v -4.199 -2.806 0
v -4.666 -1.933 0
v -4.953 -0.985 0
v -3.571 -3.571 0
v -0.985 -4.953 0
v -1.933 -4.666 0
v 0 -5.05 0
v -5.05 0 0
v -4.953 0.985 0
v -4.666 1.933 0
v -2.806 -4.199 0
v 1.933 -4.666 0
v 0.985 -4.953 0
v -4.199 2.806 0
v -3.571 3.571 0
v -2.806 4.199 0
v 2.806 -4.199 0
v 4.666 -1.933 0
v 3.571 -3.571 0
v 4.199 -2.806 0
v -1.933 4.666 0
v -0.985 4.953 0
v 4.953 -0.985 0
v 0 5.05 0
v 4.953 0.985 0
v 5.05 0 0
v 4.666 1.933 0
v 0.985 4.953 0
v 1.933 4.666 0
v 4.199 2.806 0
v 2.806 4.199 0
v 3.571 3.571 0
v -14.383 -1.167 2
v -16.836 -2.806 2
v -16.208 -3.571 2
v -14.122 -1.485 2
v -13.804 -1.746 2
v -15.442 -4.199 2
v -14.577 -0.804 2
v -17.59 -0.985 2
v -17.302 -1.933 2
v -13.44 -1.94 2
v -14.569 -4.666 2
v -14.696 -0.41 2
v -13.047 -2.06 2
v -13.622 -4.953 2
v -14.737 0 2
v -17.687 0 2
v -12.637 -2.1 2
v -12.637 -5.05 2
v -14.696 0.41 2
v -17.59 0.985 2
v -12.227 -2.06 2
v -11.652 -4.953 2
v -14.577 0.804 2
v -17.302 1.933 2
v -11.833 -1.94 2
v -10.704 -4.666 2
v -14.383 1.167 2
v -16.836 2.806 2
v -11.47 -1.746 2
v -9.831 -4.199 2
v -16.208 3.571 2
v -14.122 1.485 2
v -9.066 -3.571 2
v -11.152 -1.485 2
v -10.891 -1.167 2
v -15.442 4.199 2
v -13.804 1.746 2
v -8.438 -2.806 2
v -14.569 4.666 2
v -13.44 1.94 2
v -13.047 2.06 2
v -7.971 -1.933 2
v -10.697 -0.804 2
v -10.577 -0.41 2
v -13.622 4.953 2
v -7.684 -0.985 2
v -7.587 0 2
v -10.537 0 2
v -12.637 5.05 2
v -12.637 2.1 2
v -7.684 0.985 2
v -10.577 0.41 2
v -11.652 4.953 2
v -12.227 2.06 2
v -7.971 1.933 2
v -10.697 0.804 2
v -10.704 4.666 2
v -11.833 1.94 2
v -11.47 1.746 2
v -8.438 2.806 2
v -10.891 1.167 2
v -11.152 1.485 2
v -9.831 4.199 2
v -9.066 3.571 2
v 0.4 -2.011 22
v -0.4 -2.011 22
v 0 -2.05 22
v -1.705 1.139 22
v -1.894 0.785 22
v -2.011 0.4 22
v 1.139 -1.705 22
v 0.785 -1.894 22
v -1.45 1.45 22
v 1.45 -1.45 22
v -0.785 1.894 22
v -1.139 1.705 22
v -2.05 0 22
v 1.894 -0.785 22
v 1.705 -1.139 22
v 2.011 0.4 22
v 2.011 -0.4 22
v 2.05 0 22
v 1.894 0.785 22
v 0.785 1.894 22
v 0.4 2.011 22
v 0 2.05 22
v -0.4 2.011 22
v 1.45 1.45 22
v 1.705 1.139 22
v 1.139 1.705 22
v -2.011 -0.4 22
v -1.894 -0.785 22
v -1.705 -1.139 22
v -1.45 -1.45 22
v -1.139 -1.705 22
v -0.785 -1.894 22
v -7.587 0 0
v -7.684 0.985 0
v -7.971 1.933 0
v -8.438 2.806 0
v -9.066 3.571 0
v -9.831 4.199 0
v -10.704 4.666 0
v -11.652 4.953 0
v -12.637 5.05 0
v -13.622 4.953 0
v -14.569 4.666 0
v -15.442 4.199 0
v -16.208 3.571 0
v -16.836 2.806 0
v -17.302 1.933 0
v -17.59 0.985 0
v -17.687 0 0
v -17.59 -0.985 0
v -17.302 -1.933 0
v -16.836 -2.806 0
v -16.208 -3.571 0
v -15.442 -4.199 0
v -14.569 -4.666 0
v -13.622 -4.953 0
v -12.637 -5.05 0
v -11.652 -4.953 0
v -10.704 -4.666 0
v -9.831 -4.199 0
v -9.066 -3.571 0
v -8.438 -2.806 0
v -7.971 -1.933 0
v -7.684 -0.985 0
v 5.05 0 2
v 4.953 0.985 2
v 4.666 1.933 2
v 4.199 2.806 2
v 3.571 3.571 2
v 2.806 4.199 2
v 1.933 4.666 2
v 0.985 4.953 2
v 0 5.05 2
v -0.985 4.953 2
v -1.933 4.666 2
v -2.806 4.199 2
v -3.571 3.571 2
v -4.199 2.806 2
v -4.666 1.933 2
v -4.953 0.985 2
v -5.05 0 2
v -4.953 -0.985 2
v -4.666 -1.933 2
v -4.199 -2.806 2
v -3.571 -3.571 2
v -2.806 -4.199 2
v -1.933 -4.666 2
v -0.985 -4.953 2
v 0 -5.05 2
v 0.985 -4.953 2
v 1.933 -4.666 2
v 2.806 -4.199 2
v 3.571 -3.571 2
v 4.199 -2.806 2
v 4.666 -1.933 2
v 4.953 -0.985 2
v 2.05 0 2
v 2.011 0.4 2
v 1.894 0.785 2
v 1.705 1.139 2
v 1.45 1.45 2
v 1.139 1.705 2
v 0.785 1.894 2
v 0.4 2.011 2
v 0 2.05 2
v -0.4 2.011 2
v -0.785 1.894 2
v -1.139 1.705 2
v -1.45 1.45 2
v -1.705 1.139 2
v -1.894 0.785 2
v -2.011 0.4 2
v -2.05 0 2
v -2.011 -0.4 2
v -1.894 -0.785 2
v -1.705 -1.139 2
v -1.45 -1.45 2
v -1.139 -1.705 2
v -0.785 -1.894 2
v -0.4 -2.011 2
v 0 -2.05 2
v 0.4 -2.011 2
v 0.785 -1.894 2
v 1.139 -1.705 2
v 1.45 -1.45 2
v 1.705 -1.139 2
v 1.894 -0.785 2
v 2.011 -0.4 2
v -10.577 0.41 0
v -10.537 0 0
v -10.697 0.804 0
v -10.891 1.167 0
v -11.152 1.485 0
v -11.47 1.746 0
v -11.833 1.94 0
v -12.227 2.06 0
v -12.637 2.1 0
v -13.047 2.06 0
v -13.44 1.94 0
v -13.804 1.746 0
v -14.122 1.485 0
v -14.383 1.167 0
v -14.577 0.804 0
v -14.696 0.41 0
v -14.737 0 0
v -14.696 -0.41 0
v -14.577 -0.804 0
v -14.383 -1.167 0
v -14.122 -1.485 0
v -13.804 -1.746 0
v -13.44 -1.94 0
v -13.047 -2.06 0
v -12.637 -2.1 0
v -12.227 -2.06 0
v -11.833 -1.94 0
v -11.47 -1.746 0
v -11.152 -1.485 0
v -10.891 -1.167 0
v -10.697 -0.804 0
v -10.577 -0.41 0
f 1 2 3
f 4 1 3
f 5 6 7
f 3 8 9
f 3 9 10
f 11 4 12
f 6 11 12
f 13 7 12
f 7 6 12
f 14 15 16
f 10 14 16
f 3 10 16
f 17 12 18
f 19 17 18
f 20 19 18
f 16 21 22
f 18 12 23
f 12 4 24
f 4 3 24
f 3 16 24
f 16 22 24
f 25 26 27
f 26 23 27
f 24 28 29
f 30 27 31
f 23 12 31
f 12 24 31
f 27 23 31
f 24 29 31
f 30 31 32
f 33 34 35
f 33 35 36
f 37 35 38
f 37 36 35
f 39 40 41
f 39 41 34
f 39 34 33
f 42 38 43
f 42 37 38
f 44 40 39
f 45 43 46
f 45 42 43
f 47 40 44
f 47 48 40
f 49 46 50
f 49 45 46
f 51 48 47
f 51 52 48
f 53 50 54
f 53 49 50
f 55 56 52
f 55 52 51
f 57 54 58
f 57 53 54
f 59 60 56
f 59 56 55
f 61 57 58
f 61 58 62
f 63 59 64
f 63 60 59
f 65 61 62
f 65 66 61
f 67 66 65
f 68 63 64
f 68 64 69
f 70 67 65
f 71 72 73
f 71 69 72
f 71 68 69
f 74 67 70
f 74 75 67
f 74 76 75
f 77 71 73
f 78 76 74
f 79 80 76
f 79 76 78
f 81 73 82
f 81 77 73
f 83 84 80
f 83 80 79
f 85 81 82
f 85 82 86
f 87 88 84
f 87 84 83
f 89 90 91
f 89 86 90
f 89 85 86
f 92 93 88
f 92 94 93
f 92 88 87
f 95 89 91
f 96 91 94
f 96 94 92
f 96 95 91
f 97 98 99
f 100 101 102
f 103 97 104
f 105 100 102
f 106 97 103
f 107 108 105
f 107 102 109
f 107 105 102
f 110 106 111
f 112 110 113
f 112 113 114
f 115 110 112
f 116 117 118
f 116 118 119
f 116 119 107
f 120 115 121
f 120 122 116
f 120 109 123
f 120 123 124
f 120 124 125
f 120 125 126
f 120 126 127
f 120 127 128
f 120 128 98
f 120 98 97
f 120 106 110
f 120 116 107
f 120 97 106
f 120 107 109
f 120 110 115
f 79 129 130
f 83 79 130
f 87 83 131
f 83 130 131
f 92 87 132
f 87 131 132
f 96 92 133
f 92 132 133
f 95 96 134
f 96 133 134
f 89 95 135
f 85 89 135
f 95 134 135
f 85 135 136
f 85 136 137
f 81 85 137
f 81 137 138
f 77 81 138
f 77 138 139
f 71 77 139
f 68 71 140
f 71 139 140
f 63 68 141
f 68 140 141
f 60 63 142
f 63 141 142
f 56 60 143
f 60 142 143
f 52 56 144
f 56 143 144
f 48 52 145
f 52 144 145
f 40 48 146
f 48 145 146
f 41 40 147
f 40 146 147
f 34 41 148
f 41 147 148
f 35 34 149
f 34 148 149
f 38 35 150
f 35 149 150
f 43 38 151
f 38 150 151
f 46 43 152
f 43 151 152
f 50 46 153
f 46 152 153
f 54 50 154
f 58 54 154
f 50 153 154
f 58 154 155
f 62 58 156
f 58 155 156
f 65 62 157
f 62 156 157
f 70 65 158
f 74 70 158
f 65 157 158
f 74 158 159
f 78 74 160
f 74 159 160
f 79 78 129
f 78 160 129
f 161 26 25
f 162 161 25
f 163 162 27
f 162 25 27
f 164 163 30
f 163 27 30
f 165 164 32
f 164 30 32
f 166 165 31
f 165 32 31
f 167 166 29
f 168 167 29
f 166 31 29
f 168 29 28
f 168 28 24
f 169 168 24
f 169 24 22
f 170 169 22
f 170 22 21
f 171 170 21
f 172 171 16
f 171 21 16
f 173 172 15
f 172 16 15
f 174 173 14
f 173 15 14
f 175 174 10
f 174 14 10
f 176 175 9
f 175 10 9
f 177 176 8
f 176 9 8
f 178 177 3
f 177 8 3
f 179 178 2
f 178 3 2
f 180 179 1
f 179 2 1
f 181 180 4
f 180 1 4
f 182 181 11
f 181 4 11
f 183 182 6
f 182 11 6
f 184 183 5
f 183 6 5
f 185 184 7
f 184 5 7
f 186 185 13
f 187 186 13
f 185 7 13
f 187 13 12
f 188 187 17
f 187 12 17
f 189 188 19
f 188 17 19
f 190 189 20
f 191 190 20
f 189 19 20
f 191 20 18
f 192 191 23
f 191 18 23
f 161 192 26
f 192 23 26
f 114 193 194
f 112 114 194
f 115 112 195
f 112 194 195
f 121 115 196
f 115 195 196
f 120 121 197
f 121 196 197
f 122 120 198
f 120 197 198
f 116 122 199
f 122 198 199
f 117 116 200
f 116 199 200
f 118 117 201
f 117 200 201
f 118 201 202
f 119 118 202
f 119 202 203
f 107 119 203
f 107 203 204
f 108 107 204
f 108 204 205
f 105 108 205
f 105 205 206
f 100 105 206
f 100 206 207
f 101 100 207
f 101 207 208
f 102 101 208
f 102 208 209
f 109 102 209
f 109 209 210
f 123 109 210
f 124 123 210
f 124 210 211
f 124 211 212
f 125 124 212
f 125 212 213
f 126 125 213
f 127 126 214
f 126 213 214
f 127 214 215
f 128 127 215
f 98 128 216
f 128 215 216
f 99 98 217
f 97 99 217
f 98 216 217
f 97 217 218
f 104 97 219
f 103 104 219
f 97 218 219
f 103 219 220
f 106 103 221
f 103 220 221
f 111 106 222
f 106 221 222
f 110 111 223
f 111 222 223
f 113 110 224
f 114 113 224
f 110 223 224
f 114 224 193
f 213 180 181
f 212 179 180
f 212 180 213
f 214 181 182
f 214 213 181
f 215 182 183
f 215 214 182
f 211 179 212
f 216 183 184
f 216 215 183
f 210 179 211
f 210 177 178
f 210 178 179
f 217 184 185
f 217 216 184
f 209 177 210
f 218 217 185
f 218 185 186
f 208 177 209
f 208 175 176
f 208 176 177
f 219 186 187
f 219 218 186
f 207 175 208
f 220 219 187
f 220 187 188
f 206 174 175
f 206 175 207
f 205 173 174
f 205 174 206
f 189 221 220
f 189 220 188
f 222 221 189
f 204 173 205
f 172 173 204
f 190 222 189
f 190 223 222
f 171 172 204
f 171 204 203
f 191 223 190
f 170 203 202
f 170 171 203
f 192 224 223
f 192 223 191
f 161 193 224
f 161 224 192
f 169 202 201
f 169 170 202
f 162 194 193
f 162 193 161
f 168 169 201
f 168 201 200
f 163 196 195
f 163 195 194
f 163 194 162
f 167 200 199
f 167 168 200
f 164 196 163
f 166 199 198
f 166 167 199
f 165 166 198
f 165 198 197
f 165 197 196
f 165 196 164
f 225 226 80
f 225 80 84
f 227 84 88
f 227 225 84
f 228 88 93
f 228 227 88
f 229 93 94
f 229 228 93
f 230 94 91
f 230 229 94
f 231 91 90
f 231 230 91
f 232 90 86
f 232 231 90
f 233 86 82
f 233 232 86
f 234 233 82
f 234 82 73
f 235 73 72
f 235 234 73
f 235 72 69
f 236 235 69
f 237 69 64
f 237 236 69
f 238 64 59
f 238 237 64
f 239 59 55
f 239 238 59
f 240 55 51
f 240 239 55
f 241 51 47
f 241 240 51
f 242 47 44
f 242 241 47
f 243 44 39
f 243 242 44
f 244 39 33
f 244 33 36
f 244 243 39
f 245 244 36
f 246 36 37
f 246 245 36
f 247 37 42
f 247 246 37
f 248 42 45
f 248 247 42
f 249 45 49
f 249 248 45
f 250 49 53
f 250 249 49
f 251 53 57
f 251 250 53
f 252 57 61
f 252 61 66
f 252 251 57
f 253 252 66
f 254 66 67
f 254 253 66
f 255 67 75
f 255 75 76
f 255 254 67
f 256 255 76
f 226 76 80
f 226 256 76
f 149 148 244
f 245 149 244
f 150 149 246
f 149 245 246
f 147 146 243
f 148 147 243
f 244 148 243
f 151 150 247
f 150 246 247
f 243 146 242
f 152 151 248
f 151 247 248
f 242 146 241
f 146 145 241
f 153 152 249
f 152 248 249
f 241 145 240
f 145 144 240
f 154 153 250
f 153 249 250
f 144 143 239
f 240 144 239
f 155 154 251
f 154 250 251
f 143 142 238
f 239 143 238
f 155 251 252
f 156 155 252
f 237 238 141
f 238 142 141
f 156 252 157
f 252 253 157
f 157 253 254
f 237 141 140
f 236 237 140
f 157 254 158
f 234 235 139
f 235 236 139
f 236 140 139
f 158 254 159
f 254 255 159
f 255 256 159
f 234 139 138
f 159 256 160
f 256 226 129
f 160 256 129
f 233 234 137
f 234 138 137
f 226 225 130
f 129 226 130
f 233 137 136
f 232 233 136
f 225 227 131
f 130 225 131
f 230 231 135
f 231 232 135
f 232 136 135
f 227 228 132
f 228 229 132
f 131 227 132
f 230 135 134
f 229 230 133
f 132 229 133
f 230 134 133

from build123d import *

# Parameters (mm, degrees)
F0_R     = 5.05
F0_R_2   = 2.05
F0_R_3   = 2.1
F1_DEPTH = 2
F2_DEPTH = 22


with BuildPart() as f1:
    # F0 (on Top) → F1 (new body)
    with BuildSketch(Plane.XY):
        Circle(F0_R)
        Circle(F0_R_2, mode=Mode.SUBTRACT)
        with Locations((-12.63685, 0)):
            Circle(F0_R)
        with Locations((-12.63685, 0)):
            Circle(F0_R_3, mode=Mode.SUBTRACT)
        Circle(F0_R_2)
    extrude(amount=F1_DEPTH)

    # F0 (on Top) → F2 (join)
    with BuildSketch(Plane.XY):
        Circle(F0_R_2)
    extrude(amount=F2_DEPTH)


solid = f1.part
